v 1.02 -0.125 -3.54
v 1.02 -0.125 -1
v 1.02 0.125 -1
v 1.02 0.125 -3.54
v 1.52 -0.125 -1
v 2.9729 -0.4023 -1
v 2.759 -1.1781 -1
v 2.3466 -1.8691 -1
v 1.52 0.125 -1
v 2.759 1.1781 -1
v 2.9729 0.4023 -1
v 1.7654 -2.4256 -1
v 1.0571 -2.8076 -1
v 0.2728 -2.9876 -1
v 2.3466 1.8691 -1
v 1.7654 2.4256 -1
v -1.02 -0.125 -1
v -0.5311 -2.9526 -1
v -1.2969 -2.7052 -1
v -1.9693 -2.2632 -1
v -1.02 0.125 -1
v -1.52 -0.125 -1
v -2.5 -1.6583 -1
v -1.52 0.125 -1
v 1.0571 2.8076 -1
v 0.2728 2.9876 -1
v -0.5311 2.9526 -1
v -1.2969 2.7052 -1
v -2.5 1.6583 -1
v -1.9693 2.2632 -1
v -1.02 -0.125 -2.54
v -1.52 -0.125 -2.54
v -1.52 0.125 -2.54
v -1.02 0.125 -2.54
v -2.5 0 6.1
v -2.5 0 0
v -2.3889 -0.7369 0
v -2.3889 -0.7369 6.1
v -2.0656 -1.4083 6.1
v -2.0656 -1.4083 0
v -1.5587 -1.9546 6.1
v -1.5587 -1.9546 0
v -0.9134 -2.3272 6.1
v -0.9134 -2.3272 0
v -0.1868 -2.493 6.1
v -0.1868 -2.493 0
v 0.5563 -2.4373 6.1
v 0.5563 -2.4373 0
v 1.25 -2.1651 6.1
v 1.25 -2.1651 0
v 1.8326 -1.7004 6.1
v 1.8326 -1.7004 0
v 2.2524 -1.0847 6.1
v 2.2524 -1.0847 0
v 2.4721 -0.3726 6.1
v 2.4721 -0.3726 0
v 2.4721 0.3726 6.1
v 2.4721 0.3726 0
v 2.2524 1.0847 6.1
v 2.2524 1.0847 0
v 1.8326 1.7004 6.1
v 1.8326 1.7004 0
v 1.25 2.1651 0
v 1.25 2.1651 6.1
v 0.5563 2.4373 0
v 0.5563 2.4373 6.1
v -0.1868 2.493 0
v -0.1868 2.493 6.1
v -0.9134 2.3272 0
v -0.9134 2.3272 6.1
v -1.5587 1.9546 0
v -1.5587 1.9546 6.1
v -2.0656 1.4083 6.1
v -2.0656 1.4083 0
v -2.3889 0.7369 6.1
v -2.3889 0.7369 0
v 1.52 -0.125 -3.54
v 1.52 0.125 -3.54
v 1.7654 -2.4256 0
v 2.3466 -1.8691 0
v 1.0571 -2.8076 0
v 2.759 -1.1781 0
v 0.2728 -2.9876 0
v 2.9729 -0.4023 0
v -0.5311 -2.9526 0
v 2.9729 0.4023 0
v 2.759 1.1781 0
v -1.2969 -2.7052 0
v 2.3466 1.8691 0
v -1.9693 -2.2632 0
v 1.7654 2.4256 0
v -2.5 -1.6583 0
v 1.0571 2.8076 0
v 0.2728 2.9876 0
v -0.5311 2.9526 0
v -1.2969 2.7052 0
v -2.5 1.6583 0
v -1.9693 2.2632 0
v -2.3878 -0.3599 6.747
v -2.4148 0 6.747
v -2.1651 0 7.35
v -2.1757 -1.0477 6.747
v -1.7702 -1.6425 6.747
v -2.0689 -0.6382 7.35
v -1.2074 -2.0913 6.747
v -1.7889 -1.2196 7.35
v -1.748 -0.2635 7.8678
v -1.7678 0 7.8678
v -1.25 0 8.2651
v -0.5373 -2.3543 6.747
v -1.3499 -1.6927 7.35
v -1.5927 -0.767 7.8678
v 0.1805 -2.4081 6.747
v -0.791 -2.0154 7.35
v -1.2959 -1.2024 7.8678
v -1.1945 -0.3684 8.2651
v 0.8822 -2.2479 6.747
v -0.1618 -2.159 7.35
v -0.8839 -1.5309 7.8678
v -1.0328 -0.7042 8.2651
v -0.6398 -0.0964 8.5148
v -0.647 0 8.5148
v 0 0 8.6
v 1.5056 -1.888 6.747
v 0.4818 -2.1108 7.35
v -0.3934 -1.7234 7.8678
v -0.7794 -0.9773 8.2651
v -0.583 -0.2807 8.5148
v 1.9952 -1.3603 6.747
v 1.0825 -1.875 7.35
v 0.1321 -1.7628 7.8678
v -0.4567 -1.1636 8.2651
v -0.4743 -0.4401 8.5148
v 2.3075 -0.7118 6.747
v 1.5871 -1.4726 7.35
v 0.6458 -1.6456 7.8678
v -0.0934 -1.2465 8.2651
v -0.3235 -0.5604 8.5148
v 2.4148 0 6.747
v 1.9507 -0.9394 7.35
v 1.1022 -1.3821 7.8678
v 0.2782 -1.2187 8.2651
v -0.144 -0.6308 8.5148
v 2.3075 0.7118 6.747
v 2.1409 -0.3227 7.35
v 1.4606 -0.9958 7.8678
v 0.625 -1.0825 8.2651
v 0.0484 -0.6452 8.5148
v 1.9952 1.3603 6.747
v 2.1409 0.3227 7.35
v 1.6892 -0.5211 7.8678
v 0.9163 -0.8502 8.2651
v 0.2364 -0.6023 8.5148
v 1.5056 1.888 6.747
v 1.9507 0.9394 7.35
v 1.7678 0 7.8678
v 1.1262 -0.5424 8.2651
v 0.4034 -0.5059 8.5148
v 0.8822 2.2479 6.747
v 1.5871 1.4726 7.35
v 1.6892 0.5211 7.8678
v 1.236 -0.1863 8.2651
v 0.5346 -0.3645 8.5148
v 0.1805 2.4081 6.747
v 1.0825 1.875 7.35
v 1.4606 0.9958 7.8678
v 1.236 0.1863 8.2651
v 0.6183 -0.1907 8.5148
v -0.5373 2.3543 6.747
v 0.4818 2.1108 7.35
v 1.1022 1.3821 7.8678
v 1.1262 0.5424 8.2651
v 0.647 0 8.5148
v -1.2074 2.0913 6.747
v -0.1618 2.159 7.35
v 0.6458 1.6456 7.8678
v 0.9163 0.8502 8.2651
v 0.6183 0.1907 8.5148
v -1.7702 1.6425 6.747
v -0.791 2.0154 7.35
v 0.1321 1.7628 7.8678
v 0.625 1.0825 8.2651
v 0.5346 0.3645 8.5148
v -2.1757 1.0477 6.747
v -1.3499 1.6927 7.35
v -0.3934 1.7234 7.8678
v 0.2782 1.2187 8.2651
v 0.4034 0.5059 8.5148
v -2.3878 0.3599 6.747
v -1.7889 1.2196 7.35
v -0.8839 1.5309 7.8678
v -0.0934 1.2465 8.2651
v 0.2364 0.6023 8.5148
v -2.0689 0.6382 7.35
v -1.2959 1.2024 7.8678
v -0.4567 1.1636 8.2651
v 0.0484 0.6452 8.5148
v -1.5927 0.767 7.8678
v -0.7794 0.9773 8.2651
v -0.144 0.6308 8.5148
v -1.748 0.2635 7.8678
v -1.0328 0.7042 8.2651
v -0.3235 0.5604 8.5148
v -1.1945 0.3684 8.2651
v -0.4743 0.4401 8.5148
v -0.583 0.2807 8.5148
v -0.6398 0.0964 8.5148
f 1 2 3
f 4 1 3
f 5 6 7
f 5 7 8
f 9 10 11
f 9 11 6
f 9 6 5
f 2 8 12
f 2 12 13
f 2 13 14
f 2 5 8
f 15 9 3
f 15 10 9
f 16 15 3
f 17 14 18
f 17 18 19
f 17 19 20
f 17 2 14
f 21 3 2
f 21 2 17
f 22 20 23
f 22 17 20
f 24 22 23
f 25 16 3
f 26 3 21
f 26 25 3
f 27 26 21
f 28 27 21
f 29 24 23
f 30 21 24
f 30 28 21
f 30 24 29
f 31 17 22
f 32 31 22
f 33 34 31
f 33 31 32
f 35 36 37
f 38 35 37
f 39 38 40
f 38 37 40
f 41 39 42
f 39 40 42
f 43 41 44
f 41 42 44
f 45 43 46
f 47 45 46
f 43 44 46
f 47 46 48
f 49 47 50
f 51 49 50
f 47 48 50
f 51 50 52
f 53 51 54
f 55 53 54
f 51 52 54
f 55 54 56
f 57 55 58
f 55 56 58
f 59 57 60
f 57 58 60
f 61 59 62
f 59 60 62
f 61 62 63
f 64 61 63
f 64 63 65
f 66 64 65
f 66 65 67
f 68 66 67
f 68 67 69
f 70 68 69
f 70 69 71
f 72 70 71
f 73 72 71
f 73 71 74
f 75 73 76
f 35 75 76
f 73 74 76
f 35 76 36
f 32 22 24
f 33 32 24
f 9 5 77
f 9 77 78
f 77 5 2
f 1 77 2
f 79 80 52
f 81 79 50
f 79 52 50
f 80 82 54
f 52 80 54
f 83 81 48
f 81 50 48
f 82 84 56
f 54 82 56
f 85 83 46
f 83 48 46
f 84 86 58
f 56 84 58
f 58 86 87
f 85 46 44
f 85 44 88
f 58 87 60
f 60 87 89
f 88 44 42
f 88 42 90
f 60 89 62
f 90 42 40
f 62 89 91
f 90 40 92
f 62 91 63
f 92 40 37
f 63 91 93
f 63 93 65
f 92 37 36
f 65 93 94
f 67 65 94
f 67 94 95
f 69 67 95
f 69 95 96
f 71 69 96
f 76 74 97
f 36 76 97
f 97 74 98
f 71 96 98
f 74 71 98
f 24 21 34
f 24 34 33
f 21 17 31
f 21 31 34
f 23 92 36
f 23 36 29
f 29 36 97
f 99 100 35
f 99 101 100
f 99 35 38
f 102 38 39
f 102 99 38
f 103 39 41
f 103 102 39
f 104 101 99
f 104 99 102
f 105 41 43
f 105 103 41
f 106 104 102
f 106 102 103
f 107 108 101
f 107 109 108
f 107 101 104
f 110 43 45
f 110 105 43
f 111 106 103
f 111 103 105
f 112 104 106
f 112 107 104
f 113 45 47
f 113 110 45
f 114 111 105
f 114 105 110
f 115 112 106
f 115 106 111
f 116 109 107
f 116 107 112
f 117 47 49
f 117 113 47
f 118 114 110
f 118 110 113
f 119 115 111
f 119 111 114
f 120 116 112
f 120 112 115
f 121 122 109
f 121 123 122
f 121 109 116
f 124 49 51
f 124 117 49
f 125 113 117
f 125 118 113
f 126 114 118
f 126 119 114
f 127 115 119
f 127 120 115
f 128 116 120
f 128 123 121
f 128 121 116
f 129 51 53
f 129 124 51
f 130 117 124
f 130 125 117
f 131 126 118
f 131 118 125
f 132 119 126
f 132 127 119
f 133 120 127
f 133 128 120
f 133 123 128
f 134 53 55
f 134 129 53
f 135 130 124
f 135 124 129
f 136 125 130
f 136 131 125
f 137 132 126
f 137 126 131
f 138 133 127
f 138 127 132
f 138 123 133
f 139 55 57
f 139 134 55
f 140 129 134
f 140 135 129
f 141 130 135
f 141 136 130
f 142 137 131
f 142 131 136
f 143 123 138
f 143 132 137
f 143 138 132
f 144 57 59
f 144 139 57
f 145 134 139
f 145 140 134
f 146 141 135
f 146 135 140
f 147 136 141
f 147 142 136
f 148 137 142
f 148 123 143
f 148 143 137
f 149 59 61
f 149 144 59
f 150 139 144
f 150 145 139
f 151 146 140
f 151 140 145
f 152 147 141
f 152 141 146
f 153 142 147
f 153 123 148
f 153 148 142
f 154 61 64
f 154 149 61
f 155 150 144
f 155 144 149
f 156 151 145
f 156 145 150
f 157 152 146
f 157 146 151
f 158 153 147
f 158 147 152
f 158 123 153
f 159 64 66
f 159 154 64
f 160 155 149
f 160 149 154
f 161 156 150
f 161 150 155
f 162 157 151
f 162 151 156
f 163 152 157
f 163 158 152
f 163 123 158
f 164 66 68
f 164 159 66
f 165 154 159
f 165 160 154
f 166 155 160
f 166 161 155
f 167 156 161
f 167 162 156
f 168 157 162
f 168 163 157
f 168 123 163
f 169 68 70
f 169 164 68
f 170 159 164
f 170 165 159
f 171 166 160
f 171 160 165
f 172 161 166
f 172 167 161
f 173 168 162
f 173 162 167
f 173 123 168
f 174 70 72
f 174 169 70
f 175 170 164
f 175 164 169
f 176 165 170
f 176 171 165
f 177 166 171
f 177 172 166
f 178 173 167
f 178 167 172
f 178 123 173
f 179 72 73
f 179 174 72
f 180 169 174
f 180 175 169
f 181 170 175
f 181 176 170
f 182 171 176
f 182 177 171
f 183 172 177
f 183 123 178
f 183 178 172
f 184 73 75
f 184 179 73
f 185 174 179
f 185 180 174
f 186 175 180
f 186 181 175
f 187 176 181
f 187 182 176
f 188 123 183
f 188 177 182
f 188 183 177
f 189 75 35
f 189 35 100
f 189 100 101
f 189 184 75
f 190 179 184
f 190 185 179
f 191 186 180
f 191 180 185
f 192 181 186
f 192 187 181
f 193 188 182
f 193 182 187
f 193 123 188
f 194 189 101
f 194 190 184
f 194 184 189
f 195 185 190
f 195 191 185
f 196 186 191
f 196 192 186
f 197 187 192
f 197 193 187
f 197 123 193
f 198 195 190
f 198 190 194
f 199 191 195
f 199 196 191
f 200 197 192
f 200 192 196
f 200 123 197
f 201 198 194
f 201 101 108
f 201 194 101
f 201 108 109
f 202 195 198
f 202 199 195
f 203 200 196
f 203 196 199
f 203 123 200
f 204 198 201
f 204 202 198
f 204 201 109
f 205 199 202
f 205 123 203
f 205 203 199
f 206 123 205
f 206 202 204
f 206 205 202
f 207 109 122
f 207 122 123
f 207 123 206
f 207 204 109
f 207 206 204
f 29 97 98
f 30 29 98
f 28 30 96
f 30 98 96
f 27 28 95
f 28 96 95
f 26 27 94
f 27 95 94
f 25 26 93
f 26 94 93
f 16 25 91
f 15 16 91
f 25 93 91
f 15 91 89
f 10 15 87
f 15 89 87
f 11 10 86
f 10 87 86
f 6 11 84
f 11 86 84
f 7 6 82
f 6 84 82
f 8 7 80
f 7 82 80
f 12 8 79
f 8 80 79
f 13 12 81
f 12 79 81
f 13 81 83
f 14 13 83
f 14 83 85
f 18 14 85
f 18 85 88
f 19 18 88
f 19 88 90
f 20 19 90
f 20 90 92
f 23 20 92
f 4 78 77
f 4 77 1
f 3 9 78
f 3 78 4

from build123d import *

# Parameters (mm, degrees)
ESBO_O1_R                = 2.5
RESSALTO_EXTRUS_O1_DEPTH = 8.6
RESSALTO_EXTRUS_O2_DEPTH = 1
FILETE1_R                = 2.5
ESBO_O3_W                = 0.5
ESBO_O3_H                = 0.25
RESSALTO_EXTRUS_O3_DEPTH = 2.54
ESBO_O4_W                = 0.935535929
ESBO_O4_H                = 0.753626165
CORTE_EXTRUS_O1_DEPTH    = 1


with BuildPart() as part:
    # Esboço1 → Ressalto-extrusão1 (new body)
    with BuildSketch(Plane.XY):
        with Locations(Location((0, 0, 0), (0, 0, 180))):
            Circle(ESBO_O1_R)
    extrude(amount=RESSALTO_EXTRUS_O1_DEPTH)

    # Esboço2 → Ressalto-extrusão2 (add)
    with BuildSketch(Plane(origin=(0, 0, 0), x_dir=(-1, 0, 0), z_dir=(0, 0, -1))):
        with BuildLine():
            Line((2.5, 0), (2.5, 1.658312395))
            ThreePointArc((2.5, 1.658312395), (-3, 0), (2.5, -1.658312395))
            Line((2.5, -1.658312395), (2.5, 0))
        make_face()
    extrude(amount=RESSALTO_EXTRUS_O2_DEPTH)

    # Filete1
    filete1_edges = [part.edges().sort_by_distance(p)[0] for p in [
        (2.5, 0, 8.6),
    ]]
    fillet(filete1_edges, radius=FILETE1_R)

    # Esboço3 → Ressalto-extrusão3 (add)
    with BuildSketch(Plane(origin=(0, 0, -1), x_dir=(-1, 0, 0), z_dir=(0, 0, -1))):
        with Locations((1.27, 0)):
            Rectangle(ESBO_O3_W, ESBO_O3_H)
        with Locations((-1.27, 0)):
            Rectangle(ESBO_O3_W, ESBO_O3_H)
    extrude(amount=RESSALTO_EXTRUS_O3_DEPTH)

    # Esboço4 → Corte-extrusão1 (cut)
    with BuildSketch(Plane(origin=(0, 0, -3.54), x_dir=(-1, 0, 0), z_dir=(0, 0, -1))):
        with Locations((1.289457258, 0.005956527)):
            Rectangle(ESBO_O4_W, ESBO_O4_H)
    extrude(amount=-CORTE_EXTRUS_O1_DEPTH, mode=Mode.SUBTRACT)


solid = part.part
